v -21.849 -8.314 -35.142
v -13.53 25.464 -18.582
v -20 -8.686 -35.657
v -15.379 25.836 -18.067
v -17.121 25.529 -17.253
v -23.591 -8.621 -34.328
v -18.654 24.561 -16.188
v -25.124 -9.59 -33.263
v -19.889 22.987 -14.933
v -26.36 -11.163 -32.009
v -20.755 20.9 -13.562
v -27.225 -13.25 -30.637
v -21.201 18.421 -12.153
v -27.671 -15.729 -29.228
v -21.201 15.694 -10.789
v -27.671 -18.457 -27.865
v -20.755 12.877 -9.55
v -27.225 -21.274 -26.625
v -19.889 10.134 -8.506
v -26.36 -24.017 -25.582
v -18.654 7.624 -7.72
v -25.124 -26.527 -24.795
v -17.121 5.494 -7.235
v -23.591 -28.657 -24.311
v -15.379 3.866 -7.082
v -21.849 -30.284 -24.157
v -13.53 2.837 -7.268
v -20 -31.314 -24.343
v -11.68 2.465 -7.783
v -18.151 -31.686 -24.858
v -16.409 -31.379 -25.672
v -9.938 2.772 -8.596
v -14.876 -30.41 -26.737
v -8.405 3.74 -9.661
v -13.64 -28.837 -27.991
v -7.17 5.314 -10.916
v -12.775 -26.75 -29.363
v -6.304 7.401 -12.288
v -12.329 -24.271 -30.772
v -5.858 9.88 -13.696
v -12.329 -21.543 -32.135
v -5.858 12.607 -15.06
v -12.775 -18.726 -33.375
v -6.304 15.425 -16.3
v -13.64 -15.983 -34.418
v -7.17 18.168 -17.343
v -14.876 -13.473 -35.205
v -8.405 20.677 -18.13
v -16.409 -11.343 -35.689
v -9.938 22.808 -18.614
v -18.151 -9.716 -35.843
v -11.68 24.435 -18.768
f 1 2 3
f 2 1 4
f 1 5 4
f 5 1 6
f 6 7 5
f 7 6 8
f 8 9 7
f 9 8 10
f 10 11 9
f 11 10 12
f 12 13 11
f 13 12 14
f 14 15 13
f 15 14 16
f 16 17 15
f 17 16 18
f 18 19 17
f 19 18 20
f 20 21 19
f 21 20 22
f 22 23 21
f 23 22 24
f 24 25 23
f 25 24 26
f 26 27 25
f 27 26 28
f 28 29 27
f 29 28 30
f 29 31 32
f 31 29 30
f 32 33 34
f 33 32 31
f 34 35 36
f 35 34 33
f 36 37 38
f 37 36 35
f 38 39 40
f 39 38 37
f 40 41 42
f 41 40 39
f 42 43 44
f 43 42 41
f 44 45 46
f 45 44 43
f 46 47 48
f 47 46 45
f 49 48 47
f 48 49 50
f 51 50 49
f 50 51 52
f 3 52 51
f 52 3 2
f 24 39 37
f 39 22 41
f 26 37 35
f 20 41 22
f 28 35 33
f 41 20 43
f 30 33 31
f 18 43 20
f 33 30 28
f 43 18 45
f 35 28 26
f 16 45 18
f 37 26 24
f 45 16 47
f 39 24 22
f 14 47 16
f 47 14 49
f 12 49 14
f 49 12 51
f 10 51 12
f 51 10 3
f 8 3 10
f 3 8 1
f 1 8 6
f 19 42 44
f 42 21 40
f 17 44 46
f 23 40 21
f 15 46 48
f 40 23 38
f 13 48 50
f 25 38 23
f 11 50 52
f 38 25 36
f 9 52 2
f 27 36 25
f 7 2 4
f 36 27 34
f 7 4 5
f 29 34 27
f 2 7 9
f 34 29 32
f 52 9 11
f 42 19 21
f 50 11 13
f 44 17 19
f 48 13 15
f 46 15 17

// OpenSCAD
// Generated by generate_scads.py
translate([-20,-20,-30]) {
  scale([1.0,2.0,1.0]) {
    rotate([15,45,90]) {
      cylinder(h=25, r=8, center=false);
    }
  }
}
